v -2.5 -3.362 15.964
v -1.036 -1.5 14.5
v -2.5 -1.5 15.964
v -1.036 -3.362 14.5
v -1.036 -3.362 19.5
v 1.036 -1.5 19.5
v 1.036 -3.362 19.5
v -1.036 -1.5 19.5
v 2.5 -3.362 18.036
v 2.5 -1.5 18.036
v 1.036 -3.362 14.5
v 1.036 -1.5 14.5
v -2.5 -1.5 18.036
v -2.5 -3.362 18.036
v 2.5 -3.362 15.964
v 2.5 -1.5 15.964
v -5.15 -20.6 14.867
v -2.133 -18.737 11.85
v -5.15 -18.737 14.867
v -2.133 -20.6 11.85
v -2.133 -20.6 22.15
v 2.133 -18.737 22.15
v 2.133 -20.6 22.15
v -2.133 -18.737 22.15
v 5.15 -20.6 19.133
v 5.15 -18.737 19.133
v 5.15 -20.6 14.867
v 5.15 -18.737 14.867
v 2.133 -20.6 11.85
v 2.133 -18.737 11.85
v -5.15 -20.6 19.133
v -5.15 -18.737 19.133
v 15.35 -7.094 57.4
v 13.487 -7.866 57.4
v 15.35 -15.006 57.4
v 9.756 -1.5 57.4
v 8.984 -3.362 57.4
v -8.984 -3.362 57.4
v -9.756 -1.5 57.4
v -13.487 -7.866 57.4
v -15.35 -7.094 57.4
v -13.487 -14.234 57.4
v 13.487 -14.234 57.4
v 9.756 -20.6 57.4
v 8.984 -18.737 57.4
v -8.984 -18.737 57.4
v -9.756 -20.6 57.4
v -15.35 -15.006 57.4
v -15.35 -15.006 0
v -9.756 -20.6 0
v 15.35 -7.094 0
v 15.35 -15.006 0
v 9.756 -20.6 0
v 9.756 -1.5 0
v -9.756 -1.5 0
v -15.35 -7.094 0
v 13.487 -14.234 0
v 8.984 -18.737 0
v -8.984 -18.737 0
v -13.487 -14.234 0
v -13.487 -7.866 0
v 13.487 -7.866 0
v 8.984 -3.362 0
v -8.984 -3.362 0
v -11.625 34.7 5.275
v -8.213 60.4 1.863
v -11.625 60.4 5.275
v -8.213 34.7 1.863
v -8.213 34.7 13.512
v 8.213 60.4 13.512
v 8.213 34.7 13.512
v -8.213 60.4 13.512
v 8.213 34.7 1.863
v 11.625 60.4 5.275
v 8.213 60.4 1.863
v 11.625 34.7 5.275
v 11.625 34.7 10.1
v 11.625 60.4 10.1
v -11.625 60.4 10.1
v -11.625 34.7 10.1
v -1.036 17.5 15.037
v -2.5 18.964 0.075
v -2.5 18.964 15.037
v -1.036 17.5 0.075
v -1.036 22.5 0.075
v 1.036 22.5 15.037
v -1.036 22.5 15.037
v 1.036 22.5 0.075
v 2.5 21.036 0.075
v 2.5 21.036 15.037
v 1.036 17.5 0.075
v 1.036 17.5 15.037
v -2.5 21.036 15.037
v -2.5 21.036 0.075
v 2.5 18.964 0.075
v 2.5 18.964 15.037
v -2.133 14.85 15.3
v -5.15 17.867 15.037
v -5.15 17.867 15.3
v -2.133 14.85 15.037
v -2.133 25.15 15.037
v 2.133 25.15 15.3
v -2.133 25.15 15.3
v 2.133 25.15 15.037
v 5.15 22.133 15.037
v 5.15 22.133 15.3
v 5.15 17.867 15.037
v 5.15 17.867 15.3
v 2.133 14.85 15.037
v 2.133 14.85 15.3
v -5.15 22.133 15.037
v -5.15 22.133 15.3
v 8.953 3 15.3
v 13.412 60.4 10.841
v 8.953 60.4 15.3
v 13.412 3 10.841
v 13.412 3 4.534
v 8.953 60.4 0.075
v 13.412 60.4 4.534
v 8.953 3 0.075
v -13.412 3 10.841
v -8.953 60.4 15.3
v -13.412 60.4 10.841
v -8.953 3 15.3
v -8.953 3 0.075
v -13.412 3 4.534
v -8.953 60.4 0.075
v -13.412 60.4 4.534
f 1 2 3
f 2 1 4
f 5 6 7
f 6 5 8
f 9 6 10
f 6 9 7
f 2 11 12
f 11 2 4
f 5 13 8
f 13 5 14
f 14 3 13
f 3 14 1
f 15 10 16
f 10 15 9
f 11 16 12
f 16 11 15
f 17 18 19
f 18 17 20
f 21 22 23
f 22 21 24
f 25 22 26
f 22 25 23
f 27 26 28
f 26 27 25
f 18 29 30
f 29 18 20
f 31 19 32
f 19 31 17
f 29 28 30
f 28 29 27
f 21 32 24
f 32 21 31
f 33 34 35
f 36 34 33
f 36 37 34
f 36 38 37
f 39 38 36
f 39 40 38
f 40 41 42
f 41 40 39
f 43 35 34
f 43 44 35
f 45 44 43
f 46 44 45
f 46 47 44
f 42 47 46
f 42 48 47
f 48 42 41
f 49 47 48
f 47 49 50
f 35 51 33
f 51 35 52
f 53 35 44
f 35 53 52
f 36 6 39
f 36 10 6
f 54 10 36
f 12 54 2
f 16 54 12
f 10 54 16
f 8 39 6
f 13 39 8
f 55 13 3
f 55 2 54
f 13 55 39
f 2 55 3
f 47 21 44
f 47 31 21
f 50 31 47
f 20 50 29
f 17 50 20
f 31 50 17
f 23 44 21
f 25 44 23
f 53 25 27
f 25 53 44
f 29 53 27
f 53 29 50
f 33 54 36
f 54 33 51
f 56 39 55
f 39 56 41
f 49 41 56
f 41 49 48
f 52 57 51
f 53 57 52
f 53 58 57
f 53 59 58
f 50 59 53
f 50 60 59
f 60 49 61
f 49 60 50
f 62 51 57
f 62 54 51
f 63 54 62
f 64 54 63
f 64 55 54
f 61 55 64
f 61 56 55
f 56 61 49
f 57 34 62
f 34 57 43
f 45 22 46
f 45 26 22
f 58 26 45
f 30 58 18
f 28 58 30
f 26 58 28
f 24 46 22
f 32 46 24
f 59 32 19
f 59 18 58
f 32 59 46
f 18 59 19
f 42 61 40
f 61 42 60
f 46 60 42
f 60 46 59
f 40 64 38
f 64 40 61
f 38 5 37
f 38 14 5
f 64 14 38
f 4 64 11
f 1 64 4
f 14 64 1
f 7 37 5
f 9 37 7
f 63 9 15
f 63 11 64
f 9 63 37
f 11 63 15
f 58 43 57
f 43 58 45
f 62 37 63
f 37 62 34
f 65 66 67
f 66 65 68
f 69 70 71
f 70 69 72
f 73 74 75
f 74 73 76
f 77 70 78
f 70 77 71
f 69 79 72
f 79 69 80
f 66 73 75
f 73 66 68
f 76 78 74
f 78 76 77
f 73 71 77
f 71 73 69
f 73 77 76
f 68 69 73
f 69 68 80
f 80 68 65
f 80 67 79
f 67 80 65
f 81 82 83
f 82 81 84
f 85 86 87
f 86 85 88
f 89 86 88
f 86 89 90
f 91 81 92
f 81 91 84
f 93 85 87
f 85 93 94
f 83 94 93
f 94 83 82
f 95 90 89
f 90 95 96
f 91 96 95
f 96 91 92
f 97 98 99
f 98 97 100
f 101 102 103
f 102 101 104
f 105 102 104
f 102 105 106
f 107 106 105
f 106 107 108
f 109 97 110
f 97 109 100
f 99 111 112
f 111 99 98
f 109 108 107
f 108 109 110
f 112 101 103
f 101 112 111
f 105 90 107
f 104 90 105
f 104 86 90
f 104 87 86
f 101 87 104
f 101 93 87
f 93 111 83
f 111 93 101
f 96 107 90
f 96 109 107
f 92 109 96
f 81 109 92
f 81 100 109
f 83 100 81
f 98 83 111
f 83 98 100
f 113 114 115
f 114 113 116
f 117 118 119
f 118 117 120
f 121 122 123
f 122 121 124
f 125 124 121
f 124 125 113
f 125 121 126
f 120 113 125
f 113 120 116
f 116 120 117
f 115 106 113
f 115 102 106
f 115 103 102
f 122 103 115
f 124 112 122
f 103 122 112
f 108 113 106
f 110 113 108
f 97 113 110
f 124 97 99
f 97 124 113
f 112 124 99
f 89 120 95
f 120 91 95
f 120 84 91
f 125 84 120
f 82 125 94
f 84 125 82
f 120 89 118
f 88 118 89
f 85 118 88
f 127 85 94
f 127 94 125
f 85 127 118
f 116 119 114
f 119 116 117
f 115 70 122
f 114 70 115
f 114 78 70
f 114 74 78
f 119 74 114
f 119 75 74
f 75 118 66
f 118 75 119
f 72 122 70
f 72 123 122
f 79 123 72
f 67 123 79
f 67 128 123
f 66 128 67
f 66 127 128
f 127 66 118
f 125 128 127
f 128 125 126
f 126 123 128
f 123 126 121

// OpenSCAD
$fa=.01;
$fs=.3;

pole_d = 11.5;
pole_w = 22.1+1;
bolt_d = 4.7;
bolthead_d=9.7+.3;
plasticnut_t=5.8-4.2;

block_w = 24.6;
block_l = 34;
block_t1 = 3.8;

hole_to_end=17;
hole_to_shear=15;

new_block_overlap=25.4;

loose=.3;
tight=.15;
spacing=3;

module cyl8(h,d,center) rotate([0,0,360/16])cylinder(h=h,d=d/cos(45/2),center=center, $fn=8);

module capsule(w,d,h,center=false){
	dx= w/2-d/2;
	hull(){
		translate([-dx,0,0]) cyl8(h=h,d=d, center=center);
		translate([ dx,0,0]) cyl8(h=h,d=d, center=center);
	}
}
module pole(h=99,center=false){
	capsule(w=pole_w,d=pole_d,h=99);
}

module negative(){
	//hole for pole
	translate([0,hole_to_shear-loose])
		rotate([-90,0,0])
		rotate([0,0,180])
		capsule(w=pole_w+tight,d=pole_d+tight,h=99);
	//bolt hole
	cyl8(h=99,d=bolt_d+loose, center=true);
	//countersink
	translate([0,0,pole_d/2+plasticnut_t]) cyl8(d=bolthead_d+loose,h=99);
}


//h = pole_d+plasticnut_t+block_t1;
new_block_h = pole_d+2*block_t1;
new_block_l = hole_to_end + hole_to_shear + new_block_overlap;
new_block_w = pole_w+2*block_t1;

mid_h = (pole_d+tight+new_block_h)/2;
mid_l = (new_block_l+new_block_l)/2;
mid_w = (pole_w+tight+new_block_w)/2;



module outer_shell() difference(){
	%translate([-new_block_w/2,-hole_to_end,-new_block_h/2]) cube([new_block_w,new_block_l,new_block_h]);
	
	translate([0,-hole_to_end,0])
		rotate([-90,0,0])
		capsule(w=new_block_w,d=new_block_h,h=new_block_l);
		
	translate([0,-hole_to_end-.1,0])
		rotate([-90,0,0])
		capsule(w=mid_w,d=mid_h,h=mid_l+.2);
	
	negative();
}

module inner_shell() difference(){
	%translate([-(mid_w-tight)/2,-hole_to_end,-(mid_h-tight)/2]) cube([mid_w-tight,mid_l,mid_h-tight]);
	
	translate([0,-hole_to_end,0])
		rotate([-90,0,0])
		capsule(w=mid_w-tight,d=mid_h-tight,h=mid_l);
	
	negative();
}

translate([0,-new_block_h/2-spacing/2,hole_to_end]) rotate([90,0,0]) outer_shell();

translate([0,hole_to_end+3,mid_h/2]) inner_shell();
